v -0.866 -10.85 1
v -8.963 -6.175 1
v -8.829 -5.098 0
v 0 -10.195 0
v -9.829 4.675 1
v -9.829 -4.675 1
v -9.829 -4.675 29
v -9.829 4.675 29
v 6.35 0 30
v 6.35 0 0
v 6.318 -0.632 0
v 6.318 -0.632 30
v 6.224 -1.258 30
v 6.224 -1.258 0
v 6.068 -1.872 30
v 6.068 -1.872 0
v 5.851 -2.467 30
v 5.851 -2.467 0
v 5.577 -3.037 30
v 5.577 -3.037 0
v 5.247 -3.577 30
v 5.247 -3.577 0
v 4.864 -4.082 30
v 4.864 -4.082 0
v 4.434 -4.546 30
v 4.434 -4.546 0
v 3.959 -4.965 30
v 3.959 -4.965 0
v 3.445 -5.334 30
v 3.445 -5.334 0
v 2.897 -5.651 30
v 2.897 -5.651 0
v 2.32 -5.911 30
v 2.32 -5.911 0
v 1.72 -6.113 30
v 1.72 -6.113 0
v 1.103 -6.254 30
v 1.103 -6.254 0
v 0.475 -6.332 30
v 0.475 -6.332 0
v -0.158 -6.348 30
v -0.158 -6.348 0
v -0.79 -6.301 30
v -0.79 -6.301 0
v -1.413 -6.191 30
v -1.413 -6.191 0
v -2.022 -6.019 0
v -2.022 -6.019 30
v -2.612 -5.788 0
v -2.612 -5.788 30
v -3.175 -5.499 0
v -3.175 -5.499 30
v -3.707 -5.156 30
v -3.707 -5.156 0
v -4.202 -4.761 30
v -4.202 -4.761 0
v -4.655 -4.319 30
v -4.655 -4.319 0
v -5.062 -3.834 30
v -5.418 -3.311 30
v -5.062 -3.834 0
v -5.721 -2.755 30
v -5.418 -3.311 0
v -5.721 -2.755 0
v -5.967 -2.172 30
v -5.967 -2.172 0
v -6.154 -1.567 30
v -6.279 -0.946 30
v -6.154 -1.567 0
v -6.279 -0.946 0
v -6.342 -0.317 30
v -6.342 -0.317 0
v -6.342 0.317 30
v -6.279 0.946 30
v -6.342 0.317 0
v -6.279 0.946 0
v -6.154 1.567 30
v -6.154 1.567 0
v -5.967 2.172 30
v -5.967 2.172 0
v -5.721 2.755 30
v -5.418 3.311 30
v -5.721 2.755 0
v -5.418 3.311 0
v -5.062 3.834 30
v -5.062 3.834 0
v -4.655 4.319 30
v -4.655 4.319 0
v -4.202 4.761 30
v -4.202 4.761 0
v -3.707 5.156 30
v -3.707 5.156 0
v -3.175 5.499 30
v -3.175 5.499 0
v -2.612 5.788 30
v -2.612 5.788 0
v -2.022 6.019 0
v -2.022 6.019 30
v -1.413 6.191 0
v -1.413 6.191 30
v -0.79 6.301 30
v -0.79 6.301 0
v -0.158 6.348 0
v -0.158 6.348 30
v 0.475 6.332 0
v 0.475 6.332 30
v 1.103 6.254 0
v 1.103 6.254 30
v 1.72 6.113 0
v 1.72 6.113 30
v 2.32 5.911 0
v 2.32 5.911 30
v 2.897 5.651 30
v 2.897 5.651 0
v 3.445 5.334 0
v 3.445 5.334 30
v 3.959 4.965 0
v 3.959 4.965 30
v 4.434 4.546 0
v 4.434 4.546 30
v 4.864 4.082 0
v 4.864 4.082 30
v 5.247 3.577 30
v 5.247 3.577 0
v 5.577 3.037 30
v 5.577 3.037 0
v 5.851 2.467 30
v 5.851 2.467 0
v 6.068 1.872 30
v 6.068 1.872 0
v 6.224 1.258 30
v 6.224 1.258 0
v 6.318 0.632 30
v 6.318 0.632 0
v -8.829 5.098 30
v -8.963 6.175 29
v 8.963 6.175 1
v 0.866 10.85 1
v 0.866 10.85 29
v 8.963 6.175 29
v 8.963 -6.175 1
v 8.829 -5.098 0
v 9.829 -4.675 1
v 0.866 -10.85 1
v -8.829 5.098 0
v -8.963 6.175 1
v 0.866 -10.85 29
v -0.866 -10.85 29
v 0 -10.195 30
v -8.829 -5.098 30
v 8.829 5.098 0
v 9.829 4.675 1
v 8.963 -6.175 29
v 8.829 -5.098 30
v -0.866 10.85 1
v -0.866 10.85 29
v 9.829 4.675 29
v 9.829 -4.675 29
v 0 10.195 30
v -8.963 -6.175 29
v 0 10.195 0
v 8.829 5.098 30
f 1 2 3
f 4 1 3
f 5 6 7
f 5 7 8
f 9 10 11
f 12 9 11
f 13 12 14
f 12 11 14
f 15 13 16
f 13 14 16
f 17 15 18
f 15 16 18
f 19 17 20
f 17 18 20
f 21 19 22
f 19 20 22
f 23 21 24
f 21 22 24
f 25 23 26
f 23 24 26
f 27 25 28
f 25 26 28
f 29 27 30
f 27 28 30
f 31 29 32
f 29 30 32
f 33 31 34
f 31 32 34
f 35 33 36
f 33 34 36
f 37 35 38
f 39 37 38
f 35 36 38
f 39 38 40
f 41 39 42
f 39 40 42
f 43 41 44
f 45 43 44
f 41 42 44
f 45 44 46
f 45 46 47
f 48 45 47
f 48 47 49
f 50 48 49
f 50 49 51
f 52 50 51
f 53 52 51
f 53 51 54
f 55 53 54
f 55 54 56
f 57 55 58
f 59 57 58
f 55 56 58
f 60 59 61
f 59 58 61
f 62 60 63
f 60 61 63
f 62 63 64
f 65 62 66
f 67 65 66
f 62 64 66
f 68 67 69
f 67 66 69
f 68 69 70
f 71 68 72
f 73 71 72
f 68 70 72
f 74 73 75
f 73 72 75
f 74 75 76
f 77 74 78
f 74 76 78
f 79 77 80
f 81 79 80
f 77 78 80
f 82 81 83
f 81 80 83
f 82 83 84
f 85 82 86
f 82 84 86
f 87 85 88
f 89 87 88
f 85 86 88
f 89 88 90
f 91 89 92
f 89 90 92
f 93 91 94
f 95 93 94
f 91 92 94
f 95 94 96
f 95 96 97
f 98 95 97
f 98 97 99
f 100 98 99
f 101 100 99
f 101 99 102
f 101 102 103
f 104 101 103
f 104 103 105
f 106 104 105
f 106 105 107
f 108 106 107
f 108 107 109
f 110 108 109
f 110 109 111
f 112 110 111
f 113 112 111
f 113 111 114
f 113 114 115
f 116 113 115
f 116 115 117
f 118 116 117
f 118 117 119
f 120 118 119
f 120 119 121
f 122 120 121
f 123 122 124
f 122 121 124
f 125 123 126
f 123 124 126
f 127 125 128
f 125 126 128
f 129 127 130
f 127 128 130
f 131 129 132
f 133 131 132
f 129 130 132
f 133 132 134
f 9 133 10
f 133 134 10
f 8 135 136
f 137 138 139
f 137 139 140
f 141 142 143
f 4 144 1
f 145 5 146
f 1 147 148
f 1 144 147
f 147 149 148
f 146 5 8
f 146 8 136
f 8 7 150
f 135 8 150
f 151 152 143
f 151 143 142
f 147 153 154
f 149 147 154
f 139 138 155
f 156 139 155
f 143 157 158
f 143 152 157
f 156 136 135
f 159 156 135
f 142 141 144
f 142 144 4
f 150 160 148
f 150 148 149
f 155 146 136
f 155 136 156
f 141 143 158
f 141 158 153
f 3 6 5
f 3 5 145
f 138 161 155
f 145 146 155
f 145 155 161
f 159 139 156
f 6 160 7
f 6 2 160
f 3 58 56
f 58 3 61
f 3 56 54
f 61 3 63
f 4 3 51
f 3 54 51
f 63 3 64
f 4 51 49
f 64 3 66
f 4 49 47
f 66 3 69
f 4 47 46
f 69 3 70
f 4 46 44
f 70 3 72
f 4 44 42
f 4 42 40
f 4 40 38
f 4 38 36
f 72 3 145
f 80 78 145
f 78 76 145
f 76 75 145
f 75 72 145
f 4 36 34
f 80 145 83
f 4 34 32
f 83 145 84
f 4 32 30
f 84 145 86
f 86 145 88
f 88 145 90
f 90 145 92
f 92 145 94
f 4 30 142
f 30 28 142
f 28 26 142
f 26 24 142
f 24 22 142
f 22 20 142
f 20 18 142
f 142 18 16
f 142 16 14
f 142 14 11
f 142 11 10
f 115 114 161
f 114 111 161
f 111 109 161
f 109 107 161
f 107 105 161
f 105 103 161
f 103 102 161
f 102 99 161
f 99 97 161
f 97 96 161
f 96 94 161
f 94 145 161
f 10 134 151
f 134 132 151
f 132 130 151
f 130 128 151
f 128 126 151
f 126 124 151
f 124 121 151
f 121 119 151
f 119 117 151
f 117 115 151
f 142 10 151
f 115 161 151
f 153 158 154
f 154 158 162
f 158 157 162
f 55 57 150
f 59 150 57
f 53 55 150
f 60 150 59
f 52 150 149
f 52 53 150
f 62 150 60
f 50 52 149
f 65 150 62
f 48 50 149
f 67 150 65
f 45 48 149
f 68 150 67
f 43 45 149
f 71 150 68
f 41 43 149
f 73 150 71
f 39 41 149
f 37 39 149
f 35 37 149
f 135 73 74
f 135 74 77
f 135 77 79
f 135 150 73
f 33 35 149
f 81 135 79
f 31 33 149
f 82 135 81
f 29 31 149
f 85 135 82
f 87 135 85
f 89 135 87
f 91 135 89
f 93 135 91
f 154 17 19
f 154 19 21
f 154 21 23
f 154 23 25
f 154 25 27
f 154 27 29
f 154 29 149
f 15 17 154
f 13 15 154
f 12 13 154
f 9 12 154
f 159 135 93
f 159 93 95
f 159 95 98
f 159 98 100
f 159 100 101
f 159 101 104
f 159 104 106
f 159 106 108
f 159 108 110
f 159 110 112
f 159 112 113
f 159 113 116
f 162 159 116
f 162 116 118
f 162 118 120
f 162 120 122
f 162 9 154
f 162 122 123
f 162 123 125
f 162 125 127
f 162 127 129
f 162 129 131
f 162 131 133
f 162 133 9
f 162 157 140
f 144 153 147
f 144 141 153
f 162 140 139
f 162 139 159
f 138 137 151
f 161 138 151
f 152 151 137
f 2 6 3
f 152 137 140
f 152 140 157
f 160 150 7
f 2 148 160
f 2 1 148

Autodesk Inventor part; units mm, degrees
ref_plane "YZ Plane" through (0, 0, 0) normal (1, 0, 0) x (0, 1, 0)
ref_plane "XZ Plane" through (0, 0, 0) normal (0, 1, 0) x (-1, 0, 0)
ref_plane "XY Plane" through (0, 0, 0) normal (0, 0, 1) x (1, 0, 0)
sketch "Sketch2" plane through (0, 0, 0) normal (0, 0, 1) x (1, 0, 0)
  circle A0 centre (0, 0) radius 6.35
  line L0 (0, 0) -> (0, 11.35)
  line L1 (0, 11.35) -> (9.8294, 5.675)
  line L2 (9.8294, 5.675) -> (9.8294, -5.675)
  line L3 (9.8294, -5.675) -> (0, -11.35)
  line L4 (0, -11.35) -> (-9.8294, -5.675)
  line L5 (-9.8294, -5.675) -> (-9.8294, 5.675)
  line L6 (-9.8294, 5.675) -> (0, 11.35)
  dimension "d11" = 12.7
extrude "Extrusion2" add sketch "Sketch2" along normal blind 30
thread "Thread2" size "1/2-20 UNF" class "2B" standard "ANSI Unified Screw Threads" full length
chamfer "Chamfer2" distance 1 angle 45 18 edges at (4.9147, 8.5125, 30) (9.8294, 0, 30) (4.9147, -8.5125, 30) (-4.9147, -8.5125, 30) (-9.8294, 0, 30) (-4.9147, 8.5125, 30) (9.8294, 5.675, 15) (9.8294, -5.675, 15) (0, -11.35, 15) (-9.8294, -5.675, 15) (-9.8294, 5.675, 15) (0, 11.35, 15) (-4.9147, 8.5125, 0) (4.9147, 8.5125, 0) (9.8294, 0, 0) (4.9147, -8.5125, 0) (-4.9147, -8.5125, 0) (-9.8294, 0, 0)
properties part number "5302_Brass_Nut_0.5_20_Tx_Rx_Relative_Positioning_MPSv2_v1" material "Brass, Soft Yellow"
